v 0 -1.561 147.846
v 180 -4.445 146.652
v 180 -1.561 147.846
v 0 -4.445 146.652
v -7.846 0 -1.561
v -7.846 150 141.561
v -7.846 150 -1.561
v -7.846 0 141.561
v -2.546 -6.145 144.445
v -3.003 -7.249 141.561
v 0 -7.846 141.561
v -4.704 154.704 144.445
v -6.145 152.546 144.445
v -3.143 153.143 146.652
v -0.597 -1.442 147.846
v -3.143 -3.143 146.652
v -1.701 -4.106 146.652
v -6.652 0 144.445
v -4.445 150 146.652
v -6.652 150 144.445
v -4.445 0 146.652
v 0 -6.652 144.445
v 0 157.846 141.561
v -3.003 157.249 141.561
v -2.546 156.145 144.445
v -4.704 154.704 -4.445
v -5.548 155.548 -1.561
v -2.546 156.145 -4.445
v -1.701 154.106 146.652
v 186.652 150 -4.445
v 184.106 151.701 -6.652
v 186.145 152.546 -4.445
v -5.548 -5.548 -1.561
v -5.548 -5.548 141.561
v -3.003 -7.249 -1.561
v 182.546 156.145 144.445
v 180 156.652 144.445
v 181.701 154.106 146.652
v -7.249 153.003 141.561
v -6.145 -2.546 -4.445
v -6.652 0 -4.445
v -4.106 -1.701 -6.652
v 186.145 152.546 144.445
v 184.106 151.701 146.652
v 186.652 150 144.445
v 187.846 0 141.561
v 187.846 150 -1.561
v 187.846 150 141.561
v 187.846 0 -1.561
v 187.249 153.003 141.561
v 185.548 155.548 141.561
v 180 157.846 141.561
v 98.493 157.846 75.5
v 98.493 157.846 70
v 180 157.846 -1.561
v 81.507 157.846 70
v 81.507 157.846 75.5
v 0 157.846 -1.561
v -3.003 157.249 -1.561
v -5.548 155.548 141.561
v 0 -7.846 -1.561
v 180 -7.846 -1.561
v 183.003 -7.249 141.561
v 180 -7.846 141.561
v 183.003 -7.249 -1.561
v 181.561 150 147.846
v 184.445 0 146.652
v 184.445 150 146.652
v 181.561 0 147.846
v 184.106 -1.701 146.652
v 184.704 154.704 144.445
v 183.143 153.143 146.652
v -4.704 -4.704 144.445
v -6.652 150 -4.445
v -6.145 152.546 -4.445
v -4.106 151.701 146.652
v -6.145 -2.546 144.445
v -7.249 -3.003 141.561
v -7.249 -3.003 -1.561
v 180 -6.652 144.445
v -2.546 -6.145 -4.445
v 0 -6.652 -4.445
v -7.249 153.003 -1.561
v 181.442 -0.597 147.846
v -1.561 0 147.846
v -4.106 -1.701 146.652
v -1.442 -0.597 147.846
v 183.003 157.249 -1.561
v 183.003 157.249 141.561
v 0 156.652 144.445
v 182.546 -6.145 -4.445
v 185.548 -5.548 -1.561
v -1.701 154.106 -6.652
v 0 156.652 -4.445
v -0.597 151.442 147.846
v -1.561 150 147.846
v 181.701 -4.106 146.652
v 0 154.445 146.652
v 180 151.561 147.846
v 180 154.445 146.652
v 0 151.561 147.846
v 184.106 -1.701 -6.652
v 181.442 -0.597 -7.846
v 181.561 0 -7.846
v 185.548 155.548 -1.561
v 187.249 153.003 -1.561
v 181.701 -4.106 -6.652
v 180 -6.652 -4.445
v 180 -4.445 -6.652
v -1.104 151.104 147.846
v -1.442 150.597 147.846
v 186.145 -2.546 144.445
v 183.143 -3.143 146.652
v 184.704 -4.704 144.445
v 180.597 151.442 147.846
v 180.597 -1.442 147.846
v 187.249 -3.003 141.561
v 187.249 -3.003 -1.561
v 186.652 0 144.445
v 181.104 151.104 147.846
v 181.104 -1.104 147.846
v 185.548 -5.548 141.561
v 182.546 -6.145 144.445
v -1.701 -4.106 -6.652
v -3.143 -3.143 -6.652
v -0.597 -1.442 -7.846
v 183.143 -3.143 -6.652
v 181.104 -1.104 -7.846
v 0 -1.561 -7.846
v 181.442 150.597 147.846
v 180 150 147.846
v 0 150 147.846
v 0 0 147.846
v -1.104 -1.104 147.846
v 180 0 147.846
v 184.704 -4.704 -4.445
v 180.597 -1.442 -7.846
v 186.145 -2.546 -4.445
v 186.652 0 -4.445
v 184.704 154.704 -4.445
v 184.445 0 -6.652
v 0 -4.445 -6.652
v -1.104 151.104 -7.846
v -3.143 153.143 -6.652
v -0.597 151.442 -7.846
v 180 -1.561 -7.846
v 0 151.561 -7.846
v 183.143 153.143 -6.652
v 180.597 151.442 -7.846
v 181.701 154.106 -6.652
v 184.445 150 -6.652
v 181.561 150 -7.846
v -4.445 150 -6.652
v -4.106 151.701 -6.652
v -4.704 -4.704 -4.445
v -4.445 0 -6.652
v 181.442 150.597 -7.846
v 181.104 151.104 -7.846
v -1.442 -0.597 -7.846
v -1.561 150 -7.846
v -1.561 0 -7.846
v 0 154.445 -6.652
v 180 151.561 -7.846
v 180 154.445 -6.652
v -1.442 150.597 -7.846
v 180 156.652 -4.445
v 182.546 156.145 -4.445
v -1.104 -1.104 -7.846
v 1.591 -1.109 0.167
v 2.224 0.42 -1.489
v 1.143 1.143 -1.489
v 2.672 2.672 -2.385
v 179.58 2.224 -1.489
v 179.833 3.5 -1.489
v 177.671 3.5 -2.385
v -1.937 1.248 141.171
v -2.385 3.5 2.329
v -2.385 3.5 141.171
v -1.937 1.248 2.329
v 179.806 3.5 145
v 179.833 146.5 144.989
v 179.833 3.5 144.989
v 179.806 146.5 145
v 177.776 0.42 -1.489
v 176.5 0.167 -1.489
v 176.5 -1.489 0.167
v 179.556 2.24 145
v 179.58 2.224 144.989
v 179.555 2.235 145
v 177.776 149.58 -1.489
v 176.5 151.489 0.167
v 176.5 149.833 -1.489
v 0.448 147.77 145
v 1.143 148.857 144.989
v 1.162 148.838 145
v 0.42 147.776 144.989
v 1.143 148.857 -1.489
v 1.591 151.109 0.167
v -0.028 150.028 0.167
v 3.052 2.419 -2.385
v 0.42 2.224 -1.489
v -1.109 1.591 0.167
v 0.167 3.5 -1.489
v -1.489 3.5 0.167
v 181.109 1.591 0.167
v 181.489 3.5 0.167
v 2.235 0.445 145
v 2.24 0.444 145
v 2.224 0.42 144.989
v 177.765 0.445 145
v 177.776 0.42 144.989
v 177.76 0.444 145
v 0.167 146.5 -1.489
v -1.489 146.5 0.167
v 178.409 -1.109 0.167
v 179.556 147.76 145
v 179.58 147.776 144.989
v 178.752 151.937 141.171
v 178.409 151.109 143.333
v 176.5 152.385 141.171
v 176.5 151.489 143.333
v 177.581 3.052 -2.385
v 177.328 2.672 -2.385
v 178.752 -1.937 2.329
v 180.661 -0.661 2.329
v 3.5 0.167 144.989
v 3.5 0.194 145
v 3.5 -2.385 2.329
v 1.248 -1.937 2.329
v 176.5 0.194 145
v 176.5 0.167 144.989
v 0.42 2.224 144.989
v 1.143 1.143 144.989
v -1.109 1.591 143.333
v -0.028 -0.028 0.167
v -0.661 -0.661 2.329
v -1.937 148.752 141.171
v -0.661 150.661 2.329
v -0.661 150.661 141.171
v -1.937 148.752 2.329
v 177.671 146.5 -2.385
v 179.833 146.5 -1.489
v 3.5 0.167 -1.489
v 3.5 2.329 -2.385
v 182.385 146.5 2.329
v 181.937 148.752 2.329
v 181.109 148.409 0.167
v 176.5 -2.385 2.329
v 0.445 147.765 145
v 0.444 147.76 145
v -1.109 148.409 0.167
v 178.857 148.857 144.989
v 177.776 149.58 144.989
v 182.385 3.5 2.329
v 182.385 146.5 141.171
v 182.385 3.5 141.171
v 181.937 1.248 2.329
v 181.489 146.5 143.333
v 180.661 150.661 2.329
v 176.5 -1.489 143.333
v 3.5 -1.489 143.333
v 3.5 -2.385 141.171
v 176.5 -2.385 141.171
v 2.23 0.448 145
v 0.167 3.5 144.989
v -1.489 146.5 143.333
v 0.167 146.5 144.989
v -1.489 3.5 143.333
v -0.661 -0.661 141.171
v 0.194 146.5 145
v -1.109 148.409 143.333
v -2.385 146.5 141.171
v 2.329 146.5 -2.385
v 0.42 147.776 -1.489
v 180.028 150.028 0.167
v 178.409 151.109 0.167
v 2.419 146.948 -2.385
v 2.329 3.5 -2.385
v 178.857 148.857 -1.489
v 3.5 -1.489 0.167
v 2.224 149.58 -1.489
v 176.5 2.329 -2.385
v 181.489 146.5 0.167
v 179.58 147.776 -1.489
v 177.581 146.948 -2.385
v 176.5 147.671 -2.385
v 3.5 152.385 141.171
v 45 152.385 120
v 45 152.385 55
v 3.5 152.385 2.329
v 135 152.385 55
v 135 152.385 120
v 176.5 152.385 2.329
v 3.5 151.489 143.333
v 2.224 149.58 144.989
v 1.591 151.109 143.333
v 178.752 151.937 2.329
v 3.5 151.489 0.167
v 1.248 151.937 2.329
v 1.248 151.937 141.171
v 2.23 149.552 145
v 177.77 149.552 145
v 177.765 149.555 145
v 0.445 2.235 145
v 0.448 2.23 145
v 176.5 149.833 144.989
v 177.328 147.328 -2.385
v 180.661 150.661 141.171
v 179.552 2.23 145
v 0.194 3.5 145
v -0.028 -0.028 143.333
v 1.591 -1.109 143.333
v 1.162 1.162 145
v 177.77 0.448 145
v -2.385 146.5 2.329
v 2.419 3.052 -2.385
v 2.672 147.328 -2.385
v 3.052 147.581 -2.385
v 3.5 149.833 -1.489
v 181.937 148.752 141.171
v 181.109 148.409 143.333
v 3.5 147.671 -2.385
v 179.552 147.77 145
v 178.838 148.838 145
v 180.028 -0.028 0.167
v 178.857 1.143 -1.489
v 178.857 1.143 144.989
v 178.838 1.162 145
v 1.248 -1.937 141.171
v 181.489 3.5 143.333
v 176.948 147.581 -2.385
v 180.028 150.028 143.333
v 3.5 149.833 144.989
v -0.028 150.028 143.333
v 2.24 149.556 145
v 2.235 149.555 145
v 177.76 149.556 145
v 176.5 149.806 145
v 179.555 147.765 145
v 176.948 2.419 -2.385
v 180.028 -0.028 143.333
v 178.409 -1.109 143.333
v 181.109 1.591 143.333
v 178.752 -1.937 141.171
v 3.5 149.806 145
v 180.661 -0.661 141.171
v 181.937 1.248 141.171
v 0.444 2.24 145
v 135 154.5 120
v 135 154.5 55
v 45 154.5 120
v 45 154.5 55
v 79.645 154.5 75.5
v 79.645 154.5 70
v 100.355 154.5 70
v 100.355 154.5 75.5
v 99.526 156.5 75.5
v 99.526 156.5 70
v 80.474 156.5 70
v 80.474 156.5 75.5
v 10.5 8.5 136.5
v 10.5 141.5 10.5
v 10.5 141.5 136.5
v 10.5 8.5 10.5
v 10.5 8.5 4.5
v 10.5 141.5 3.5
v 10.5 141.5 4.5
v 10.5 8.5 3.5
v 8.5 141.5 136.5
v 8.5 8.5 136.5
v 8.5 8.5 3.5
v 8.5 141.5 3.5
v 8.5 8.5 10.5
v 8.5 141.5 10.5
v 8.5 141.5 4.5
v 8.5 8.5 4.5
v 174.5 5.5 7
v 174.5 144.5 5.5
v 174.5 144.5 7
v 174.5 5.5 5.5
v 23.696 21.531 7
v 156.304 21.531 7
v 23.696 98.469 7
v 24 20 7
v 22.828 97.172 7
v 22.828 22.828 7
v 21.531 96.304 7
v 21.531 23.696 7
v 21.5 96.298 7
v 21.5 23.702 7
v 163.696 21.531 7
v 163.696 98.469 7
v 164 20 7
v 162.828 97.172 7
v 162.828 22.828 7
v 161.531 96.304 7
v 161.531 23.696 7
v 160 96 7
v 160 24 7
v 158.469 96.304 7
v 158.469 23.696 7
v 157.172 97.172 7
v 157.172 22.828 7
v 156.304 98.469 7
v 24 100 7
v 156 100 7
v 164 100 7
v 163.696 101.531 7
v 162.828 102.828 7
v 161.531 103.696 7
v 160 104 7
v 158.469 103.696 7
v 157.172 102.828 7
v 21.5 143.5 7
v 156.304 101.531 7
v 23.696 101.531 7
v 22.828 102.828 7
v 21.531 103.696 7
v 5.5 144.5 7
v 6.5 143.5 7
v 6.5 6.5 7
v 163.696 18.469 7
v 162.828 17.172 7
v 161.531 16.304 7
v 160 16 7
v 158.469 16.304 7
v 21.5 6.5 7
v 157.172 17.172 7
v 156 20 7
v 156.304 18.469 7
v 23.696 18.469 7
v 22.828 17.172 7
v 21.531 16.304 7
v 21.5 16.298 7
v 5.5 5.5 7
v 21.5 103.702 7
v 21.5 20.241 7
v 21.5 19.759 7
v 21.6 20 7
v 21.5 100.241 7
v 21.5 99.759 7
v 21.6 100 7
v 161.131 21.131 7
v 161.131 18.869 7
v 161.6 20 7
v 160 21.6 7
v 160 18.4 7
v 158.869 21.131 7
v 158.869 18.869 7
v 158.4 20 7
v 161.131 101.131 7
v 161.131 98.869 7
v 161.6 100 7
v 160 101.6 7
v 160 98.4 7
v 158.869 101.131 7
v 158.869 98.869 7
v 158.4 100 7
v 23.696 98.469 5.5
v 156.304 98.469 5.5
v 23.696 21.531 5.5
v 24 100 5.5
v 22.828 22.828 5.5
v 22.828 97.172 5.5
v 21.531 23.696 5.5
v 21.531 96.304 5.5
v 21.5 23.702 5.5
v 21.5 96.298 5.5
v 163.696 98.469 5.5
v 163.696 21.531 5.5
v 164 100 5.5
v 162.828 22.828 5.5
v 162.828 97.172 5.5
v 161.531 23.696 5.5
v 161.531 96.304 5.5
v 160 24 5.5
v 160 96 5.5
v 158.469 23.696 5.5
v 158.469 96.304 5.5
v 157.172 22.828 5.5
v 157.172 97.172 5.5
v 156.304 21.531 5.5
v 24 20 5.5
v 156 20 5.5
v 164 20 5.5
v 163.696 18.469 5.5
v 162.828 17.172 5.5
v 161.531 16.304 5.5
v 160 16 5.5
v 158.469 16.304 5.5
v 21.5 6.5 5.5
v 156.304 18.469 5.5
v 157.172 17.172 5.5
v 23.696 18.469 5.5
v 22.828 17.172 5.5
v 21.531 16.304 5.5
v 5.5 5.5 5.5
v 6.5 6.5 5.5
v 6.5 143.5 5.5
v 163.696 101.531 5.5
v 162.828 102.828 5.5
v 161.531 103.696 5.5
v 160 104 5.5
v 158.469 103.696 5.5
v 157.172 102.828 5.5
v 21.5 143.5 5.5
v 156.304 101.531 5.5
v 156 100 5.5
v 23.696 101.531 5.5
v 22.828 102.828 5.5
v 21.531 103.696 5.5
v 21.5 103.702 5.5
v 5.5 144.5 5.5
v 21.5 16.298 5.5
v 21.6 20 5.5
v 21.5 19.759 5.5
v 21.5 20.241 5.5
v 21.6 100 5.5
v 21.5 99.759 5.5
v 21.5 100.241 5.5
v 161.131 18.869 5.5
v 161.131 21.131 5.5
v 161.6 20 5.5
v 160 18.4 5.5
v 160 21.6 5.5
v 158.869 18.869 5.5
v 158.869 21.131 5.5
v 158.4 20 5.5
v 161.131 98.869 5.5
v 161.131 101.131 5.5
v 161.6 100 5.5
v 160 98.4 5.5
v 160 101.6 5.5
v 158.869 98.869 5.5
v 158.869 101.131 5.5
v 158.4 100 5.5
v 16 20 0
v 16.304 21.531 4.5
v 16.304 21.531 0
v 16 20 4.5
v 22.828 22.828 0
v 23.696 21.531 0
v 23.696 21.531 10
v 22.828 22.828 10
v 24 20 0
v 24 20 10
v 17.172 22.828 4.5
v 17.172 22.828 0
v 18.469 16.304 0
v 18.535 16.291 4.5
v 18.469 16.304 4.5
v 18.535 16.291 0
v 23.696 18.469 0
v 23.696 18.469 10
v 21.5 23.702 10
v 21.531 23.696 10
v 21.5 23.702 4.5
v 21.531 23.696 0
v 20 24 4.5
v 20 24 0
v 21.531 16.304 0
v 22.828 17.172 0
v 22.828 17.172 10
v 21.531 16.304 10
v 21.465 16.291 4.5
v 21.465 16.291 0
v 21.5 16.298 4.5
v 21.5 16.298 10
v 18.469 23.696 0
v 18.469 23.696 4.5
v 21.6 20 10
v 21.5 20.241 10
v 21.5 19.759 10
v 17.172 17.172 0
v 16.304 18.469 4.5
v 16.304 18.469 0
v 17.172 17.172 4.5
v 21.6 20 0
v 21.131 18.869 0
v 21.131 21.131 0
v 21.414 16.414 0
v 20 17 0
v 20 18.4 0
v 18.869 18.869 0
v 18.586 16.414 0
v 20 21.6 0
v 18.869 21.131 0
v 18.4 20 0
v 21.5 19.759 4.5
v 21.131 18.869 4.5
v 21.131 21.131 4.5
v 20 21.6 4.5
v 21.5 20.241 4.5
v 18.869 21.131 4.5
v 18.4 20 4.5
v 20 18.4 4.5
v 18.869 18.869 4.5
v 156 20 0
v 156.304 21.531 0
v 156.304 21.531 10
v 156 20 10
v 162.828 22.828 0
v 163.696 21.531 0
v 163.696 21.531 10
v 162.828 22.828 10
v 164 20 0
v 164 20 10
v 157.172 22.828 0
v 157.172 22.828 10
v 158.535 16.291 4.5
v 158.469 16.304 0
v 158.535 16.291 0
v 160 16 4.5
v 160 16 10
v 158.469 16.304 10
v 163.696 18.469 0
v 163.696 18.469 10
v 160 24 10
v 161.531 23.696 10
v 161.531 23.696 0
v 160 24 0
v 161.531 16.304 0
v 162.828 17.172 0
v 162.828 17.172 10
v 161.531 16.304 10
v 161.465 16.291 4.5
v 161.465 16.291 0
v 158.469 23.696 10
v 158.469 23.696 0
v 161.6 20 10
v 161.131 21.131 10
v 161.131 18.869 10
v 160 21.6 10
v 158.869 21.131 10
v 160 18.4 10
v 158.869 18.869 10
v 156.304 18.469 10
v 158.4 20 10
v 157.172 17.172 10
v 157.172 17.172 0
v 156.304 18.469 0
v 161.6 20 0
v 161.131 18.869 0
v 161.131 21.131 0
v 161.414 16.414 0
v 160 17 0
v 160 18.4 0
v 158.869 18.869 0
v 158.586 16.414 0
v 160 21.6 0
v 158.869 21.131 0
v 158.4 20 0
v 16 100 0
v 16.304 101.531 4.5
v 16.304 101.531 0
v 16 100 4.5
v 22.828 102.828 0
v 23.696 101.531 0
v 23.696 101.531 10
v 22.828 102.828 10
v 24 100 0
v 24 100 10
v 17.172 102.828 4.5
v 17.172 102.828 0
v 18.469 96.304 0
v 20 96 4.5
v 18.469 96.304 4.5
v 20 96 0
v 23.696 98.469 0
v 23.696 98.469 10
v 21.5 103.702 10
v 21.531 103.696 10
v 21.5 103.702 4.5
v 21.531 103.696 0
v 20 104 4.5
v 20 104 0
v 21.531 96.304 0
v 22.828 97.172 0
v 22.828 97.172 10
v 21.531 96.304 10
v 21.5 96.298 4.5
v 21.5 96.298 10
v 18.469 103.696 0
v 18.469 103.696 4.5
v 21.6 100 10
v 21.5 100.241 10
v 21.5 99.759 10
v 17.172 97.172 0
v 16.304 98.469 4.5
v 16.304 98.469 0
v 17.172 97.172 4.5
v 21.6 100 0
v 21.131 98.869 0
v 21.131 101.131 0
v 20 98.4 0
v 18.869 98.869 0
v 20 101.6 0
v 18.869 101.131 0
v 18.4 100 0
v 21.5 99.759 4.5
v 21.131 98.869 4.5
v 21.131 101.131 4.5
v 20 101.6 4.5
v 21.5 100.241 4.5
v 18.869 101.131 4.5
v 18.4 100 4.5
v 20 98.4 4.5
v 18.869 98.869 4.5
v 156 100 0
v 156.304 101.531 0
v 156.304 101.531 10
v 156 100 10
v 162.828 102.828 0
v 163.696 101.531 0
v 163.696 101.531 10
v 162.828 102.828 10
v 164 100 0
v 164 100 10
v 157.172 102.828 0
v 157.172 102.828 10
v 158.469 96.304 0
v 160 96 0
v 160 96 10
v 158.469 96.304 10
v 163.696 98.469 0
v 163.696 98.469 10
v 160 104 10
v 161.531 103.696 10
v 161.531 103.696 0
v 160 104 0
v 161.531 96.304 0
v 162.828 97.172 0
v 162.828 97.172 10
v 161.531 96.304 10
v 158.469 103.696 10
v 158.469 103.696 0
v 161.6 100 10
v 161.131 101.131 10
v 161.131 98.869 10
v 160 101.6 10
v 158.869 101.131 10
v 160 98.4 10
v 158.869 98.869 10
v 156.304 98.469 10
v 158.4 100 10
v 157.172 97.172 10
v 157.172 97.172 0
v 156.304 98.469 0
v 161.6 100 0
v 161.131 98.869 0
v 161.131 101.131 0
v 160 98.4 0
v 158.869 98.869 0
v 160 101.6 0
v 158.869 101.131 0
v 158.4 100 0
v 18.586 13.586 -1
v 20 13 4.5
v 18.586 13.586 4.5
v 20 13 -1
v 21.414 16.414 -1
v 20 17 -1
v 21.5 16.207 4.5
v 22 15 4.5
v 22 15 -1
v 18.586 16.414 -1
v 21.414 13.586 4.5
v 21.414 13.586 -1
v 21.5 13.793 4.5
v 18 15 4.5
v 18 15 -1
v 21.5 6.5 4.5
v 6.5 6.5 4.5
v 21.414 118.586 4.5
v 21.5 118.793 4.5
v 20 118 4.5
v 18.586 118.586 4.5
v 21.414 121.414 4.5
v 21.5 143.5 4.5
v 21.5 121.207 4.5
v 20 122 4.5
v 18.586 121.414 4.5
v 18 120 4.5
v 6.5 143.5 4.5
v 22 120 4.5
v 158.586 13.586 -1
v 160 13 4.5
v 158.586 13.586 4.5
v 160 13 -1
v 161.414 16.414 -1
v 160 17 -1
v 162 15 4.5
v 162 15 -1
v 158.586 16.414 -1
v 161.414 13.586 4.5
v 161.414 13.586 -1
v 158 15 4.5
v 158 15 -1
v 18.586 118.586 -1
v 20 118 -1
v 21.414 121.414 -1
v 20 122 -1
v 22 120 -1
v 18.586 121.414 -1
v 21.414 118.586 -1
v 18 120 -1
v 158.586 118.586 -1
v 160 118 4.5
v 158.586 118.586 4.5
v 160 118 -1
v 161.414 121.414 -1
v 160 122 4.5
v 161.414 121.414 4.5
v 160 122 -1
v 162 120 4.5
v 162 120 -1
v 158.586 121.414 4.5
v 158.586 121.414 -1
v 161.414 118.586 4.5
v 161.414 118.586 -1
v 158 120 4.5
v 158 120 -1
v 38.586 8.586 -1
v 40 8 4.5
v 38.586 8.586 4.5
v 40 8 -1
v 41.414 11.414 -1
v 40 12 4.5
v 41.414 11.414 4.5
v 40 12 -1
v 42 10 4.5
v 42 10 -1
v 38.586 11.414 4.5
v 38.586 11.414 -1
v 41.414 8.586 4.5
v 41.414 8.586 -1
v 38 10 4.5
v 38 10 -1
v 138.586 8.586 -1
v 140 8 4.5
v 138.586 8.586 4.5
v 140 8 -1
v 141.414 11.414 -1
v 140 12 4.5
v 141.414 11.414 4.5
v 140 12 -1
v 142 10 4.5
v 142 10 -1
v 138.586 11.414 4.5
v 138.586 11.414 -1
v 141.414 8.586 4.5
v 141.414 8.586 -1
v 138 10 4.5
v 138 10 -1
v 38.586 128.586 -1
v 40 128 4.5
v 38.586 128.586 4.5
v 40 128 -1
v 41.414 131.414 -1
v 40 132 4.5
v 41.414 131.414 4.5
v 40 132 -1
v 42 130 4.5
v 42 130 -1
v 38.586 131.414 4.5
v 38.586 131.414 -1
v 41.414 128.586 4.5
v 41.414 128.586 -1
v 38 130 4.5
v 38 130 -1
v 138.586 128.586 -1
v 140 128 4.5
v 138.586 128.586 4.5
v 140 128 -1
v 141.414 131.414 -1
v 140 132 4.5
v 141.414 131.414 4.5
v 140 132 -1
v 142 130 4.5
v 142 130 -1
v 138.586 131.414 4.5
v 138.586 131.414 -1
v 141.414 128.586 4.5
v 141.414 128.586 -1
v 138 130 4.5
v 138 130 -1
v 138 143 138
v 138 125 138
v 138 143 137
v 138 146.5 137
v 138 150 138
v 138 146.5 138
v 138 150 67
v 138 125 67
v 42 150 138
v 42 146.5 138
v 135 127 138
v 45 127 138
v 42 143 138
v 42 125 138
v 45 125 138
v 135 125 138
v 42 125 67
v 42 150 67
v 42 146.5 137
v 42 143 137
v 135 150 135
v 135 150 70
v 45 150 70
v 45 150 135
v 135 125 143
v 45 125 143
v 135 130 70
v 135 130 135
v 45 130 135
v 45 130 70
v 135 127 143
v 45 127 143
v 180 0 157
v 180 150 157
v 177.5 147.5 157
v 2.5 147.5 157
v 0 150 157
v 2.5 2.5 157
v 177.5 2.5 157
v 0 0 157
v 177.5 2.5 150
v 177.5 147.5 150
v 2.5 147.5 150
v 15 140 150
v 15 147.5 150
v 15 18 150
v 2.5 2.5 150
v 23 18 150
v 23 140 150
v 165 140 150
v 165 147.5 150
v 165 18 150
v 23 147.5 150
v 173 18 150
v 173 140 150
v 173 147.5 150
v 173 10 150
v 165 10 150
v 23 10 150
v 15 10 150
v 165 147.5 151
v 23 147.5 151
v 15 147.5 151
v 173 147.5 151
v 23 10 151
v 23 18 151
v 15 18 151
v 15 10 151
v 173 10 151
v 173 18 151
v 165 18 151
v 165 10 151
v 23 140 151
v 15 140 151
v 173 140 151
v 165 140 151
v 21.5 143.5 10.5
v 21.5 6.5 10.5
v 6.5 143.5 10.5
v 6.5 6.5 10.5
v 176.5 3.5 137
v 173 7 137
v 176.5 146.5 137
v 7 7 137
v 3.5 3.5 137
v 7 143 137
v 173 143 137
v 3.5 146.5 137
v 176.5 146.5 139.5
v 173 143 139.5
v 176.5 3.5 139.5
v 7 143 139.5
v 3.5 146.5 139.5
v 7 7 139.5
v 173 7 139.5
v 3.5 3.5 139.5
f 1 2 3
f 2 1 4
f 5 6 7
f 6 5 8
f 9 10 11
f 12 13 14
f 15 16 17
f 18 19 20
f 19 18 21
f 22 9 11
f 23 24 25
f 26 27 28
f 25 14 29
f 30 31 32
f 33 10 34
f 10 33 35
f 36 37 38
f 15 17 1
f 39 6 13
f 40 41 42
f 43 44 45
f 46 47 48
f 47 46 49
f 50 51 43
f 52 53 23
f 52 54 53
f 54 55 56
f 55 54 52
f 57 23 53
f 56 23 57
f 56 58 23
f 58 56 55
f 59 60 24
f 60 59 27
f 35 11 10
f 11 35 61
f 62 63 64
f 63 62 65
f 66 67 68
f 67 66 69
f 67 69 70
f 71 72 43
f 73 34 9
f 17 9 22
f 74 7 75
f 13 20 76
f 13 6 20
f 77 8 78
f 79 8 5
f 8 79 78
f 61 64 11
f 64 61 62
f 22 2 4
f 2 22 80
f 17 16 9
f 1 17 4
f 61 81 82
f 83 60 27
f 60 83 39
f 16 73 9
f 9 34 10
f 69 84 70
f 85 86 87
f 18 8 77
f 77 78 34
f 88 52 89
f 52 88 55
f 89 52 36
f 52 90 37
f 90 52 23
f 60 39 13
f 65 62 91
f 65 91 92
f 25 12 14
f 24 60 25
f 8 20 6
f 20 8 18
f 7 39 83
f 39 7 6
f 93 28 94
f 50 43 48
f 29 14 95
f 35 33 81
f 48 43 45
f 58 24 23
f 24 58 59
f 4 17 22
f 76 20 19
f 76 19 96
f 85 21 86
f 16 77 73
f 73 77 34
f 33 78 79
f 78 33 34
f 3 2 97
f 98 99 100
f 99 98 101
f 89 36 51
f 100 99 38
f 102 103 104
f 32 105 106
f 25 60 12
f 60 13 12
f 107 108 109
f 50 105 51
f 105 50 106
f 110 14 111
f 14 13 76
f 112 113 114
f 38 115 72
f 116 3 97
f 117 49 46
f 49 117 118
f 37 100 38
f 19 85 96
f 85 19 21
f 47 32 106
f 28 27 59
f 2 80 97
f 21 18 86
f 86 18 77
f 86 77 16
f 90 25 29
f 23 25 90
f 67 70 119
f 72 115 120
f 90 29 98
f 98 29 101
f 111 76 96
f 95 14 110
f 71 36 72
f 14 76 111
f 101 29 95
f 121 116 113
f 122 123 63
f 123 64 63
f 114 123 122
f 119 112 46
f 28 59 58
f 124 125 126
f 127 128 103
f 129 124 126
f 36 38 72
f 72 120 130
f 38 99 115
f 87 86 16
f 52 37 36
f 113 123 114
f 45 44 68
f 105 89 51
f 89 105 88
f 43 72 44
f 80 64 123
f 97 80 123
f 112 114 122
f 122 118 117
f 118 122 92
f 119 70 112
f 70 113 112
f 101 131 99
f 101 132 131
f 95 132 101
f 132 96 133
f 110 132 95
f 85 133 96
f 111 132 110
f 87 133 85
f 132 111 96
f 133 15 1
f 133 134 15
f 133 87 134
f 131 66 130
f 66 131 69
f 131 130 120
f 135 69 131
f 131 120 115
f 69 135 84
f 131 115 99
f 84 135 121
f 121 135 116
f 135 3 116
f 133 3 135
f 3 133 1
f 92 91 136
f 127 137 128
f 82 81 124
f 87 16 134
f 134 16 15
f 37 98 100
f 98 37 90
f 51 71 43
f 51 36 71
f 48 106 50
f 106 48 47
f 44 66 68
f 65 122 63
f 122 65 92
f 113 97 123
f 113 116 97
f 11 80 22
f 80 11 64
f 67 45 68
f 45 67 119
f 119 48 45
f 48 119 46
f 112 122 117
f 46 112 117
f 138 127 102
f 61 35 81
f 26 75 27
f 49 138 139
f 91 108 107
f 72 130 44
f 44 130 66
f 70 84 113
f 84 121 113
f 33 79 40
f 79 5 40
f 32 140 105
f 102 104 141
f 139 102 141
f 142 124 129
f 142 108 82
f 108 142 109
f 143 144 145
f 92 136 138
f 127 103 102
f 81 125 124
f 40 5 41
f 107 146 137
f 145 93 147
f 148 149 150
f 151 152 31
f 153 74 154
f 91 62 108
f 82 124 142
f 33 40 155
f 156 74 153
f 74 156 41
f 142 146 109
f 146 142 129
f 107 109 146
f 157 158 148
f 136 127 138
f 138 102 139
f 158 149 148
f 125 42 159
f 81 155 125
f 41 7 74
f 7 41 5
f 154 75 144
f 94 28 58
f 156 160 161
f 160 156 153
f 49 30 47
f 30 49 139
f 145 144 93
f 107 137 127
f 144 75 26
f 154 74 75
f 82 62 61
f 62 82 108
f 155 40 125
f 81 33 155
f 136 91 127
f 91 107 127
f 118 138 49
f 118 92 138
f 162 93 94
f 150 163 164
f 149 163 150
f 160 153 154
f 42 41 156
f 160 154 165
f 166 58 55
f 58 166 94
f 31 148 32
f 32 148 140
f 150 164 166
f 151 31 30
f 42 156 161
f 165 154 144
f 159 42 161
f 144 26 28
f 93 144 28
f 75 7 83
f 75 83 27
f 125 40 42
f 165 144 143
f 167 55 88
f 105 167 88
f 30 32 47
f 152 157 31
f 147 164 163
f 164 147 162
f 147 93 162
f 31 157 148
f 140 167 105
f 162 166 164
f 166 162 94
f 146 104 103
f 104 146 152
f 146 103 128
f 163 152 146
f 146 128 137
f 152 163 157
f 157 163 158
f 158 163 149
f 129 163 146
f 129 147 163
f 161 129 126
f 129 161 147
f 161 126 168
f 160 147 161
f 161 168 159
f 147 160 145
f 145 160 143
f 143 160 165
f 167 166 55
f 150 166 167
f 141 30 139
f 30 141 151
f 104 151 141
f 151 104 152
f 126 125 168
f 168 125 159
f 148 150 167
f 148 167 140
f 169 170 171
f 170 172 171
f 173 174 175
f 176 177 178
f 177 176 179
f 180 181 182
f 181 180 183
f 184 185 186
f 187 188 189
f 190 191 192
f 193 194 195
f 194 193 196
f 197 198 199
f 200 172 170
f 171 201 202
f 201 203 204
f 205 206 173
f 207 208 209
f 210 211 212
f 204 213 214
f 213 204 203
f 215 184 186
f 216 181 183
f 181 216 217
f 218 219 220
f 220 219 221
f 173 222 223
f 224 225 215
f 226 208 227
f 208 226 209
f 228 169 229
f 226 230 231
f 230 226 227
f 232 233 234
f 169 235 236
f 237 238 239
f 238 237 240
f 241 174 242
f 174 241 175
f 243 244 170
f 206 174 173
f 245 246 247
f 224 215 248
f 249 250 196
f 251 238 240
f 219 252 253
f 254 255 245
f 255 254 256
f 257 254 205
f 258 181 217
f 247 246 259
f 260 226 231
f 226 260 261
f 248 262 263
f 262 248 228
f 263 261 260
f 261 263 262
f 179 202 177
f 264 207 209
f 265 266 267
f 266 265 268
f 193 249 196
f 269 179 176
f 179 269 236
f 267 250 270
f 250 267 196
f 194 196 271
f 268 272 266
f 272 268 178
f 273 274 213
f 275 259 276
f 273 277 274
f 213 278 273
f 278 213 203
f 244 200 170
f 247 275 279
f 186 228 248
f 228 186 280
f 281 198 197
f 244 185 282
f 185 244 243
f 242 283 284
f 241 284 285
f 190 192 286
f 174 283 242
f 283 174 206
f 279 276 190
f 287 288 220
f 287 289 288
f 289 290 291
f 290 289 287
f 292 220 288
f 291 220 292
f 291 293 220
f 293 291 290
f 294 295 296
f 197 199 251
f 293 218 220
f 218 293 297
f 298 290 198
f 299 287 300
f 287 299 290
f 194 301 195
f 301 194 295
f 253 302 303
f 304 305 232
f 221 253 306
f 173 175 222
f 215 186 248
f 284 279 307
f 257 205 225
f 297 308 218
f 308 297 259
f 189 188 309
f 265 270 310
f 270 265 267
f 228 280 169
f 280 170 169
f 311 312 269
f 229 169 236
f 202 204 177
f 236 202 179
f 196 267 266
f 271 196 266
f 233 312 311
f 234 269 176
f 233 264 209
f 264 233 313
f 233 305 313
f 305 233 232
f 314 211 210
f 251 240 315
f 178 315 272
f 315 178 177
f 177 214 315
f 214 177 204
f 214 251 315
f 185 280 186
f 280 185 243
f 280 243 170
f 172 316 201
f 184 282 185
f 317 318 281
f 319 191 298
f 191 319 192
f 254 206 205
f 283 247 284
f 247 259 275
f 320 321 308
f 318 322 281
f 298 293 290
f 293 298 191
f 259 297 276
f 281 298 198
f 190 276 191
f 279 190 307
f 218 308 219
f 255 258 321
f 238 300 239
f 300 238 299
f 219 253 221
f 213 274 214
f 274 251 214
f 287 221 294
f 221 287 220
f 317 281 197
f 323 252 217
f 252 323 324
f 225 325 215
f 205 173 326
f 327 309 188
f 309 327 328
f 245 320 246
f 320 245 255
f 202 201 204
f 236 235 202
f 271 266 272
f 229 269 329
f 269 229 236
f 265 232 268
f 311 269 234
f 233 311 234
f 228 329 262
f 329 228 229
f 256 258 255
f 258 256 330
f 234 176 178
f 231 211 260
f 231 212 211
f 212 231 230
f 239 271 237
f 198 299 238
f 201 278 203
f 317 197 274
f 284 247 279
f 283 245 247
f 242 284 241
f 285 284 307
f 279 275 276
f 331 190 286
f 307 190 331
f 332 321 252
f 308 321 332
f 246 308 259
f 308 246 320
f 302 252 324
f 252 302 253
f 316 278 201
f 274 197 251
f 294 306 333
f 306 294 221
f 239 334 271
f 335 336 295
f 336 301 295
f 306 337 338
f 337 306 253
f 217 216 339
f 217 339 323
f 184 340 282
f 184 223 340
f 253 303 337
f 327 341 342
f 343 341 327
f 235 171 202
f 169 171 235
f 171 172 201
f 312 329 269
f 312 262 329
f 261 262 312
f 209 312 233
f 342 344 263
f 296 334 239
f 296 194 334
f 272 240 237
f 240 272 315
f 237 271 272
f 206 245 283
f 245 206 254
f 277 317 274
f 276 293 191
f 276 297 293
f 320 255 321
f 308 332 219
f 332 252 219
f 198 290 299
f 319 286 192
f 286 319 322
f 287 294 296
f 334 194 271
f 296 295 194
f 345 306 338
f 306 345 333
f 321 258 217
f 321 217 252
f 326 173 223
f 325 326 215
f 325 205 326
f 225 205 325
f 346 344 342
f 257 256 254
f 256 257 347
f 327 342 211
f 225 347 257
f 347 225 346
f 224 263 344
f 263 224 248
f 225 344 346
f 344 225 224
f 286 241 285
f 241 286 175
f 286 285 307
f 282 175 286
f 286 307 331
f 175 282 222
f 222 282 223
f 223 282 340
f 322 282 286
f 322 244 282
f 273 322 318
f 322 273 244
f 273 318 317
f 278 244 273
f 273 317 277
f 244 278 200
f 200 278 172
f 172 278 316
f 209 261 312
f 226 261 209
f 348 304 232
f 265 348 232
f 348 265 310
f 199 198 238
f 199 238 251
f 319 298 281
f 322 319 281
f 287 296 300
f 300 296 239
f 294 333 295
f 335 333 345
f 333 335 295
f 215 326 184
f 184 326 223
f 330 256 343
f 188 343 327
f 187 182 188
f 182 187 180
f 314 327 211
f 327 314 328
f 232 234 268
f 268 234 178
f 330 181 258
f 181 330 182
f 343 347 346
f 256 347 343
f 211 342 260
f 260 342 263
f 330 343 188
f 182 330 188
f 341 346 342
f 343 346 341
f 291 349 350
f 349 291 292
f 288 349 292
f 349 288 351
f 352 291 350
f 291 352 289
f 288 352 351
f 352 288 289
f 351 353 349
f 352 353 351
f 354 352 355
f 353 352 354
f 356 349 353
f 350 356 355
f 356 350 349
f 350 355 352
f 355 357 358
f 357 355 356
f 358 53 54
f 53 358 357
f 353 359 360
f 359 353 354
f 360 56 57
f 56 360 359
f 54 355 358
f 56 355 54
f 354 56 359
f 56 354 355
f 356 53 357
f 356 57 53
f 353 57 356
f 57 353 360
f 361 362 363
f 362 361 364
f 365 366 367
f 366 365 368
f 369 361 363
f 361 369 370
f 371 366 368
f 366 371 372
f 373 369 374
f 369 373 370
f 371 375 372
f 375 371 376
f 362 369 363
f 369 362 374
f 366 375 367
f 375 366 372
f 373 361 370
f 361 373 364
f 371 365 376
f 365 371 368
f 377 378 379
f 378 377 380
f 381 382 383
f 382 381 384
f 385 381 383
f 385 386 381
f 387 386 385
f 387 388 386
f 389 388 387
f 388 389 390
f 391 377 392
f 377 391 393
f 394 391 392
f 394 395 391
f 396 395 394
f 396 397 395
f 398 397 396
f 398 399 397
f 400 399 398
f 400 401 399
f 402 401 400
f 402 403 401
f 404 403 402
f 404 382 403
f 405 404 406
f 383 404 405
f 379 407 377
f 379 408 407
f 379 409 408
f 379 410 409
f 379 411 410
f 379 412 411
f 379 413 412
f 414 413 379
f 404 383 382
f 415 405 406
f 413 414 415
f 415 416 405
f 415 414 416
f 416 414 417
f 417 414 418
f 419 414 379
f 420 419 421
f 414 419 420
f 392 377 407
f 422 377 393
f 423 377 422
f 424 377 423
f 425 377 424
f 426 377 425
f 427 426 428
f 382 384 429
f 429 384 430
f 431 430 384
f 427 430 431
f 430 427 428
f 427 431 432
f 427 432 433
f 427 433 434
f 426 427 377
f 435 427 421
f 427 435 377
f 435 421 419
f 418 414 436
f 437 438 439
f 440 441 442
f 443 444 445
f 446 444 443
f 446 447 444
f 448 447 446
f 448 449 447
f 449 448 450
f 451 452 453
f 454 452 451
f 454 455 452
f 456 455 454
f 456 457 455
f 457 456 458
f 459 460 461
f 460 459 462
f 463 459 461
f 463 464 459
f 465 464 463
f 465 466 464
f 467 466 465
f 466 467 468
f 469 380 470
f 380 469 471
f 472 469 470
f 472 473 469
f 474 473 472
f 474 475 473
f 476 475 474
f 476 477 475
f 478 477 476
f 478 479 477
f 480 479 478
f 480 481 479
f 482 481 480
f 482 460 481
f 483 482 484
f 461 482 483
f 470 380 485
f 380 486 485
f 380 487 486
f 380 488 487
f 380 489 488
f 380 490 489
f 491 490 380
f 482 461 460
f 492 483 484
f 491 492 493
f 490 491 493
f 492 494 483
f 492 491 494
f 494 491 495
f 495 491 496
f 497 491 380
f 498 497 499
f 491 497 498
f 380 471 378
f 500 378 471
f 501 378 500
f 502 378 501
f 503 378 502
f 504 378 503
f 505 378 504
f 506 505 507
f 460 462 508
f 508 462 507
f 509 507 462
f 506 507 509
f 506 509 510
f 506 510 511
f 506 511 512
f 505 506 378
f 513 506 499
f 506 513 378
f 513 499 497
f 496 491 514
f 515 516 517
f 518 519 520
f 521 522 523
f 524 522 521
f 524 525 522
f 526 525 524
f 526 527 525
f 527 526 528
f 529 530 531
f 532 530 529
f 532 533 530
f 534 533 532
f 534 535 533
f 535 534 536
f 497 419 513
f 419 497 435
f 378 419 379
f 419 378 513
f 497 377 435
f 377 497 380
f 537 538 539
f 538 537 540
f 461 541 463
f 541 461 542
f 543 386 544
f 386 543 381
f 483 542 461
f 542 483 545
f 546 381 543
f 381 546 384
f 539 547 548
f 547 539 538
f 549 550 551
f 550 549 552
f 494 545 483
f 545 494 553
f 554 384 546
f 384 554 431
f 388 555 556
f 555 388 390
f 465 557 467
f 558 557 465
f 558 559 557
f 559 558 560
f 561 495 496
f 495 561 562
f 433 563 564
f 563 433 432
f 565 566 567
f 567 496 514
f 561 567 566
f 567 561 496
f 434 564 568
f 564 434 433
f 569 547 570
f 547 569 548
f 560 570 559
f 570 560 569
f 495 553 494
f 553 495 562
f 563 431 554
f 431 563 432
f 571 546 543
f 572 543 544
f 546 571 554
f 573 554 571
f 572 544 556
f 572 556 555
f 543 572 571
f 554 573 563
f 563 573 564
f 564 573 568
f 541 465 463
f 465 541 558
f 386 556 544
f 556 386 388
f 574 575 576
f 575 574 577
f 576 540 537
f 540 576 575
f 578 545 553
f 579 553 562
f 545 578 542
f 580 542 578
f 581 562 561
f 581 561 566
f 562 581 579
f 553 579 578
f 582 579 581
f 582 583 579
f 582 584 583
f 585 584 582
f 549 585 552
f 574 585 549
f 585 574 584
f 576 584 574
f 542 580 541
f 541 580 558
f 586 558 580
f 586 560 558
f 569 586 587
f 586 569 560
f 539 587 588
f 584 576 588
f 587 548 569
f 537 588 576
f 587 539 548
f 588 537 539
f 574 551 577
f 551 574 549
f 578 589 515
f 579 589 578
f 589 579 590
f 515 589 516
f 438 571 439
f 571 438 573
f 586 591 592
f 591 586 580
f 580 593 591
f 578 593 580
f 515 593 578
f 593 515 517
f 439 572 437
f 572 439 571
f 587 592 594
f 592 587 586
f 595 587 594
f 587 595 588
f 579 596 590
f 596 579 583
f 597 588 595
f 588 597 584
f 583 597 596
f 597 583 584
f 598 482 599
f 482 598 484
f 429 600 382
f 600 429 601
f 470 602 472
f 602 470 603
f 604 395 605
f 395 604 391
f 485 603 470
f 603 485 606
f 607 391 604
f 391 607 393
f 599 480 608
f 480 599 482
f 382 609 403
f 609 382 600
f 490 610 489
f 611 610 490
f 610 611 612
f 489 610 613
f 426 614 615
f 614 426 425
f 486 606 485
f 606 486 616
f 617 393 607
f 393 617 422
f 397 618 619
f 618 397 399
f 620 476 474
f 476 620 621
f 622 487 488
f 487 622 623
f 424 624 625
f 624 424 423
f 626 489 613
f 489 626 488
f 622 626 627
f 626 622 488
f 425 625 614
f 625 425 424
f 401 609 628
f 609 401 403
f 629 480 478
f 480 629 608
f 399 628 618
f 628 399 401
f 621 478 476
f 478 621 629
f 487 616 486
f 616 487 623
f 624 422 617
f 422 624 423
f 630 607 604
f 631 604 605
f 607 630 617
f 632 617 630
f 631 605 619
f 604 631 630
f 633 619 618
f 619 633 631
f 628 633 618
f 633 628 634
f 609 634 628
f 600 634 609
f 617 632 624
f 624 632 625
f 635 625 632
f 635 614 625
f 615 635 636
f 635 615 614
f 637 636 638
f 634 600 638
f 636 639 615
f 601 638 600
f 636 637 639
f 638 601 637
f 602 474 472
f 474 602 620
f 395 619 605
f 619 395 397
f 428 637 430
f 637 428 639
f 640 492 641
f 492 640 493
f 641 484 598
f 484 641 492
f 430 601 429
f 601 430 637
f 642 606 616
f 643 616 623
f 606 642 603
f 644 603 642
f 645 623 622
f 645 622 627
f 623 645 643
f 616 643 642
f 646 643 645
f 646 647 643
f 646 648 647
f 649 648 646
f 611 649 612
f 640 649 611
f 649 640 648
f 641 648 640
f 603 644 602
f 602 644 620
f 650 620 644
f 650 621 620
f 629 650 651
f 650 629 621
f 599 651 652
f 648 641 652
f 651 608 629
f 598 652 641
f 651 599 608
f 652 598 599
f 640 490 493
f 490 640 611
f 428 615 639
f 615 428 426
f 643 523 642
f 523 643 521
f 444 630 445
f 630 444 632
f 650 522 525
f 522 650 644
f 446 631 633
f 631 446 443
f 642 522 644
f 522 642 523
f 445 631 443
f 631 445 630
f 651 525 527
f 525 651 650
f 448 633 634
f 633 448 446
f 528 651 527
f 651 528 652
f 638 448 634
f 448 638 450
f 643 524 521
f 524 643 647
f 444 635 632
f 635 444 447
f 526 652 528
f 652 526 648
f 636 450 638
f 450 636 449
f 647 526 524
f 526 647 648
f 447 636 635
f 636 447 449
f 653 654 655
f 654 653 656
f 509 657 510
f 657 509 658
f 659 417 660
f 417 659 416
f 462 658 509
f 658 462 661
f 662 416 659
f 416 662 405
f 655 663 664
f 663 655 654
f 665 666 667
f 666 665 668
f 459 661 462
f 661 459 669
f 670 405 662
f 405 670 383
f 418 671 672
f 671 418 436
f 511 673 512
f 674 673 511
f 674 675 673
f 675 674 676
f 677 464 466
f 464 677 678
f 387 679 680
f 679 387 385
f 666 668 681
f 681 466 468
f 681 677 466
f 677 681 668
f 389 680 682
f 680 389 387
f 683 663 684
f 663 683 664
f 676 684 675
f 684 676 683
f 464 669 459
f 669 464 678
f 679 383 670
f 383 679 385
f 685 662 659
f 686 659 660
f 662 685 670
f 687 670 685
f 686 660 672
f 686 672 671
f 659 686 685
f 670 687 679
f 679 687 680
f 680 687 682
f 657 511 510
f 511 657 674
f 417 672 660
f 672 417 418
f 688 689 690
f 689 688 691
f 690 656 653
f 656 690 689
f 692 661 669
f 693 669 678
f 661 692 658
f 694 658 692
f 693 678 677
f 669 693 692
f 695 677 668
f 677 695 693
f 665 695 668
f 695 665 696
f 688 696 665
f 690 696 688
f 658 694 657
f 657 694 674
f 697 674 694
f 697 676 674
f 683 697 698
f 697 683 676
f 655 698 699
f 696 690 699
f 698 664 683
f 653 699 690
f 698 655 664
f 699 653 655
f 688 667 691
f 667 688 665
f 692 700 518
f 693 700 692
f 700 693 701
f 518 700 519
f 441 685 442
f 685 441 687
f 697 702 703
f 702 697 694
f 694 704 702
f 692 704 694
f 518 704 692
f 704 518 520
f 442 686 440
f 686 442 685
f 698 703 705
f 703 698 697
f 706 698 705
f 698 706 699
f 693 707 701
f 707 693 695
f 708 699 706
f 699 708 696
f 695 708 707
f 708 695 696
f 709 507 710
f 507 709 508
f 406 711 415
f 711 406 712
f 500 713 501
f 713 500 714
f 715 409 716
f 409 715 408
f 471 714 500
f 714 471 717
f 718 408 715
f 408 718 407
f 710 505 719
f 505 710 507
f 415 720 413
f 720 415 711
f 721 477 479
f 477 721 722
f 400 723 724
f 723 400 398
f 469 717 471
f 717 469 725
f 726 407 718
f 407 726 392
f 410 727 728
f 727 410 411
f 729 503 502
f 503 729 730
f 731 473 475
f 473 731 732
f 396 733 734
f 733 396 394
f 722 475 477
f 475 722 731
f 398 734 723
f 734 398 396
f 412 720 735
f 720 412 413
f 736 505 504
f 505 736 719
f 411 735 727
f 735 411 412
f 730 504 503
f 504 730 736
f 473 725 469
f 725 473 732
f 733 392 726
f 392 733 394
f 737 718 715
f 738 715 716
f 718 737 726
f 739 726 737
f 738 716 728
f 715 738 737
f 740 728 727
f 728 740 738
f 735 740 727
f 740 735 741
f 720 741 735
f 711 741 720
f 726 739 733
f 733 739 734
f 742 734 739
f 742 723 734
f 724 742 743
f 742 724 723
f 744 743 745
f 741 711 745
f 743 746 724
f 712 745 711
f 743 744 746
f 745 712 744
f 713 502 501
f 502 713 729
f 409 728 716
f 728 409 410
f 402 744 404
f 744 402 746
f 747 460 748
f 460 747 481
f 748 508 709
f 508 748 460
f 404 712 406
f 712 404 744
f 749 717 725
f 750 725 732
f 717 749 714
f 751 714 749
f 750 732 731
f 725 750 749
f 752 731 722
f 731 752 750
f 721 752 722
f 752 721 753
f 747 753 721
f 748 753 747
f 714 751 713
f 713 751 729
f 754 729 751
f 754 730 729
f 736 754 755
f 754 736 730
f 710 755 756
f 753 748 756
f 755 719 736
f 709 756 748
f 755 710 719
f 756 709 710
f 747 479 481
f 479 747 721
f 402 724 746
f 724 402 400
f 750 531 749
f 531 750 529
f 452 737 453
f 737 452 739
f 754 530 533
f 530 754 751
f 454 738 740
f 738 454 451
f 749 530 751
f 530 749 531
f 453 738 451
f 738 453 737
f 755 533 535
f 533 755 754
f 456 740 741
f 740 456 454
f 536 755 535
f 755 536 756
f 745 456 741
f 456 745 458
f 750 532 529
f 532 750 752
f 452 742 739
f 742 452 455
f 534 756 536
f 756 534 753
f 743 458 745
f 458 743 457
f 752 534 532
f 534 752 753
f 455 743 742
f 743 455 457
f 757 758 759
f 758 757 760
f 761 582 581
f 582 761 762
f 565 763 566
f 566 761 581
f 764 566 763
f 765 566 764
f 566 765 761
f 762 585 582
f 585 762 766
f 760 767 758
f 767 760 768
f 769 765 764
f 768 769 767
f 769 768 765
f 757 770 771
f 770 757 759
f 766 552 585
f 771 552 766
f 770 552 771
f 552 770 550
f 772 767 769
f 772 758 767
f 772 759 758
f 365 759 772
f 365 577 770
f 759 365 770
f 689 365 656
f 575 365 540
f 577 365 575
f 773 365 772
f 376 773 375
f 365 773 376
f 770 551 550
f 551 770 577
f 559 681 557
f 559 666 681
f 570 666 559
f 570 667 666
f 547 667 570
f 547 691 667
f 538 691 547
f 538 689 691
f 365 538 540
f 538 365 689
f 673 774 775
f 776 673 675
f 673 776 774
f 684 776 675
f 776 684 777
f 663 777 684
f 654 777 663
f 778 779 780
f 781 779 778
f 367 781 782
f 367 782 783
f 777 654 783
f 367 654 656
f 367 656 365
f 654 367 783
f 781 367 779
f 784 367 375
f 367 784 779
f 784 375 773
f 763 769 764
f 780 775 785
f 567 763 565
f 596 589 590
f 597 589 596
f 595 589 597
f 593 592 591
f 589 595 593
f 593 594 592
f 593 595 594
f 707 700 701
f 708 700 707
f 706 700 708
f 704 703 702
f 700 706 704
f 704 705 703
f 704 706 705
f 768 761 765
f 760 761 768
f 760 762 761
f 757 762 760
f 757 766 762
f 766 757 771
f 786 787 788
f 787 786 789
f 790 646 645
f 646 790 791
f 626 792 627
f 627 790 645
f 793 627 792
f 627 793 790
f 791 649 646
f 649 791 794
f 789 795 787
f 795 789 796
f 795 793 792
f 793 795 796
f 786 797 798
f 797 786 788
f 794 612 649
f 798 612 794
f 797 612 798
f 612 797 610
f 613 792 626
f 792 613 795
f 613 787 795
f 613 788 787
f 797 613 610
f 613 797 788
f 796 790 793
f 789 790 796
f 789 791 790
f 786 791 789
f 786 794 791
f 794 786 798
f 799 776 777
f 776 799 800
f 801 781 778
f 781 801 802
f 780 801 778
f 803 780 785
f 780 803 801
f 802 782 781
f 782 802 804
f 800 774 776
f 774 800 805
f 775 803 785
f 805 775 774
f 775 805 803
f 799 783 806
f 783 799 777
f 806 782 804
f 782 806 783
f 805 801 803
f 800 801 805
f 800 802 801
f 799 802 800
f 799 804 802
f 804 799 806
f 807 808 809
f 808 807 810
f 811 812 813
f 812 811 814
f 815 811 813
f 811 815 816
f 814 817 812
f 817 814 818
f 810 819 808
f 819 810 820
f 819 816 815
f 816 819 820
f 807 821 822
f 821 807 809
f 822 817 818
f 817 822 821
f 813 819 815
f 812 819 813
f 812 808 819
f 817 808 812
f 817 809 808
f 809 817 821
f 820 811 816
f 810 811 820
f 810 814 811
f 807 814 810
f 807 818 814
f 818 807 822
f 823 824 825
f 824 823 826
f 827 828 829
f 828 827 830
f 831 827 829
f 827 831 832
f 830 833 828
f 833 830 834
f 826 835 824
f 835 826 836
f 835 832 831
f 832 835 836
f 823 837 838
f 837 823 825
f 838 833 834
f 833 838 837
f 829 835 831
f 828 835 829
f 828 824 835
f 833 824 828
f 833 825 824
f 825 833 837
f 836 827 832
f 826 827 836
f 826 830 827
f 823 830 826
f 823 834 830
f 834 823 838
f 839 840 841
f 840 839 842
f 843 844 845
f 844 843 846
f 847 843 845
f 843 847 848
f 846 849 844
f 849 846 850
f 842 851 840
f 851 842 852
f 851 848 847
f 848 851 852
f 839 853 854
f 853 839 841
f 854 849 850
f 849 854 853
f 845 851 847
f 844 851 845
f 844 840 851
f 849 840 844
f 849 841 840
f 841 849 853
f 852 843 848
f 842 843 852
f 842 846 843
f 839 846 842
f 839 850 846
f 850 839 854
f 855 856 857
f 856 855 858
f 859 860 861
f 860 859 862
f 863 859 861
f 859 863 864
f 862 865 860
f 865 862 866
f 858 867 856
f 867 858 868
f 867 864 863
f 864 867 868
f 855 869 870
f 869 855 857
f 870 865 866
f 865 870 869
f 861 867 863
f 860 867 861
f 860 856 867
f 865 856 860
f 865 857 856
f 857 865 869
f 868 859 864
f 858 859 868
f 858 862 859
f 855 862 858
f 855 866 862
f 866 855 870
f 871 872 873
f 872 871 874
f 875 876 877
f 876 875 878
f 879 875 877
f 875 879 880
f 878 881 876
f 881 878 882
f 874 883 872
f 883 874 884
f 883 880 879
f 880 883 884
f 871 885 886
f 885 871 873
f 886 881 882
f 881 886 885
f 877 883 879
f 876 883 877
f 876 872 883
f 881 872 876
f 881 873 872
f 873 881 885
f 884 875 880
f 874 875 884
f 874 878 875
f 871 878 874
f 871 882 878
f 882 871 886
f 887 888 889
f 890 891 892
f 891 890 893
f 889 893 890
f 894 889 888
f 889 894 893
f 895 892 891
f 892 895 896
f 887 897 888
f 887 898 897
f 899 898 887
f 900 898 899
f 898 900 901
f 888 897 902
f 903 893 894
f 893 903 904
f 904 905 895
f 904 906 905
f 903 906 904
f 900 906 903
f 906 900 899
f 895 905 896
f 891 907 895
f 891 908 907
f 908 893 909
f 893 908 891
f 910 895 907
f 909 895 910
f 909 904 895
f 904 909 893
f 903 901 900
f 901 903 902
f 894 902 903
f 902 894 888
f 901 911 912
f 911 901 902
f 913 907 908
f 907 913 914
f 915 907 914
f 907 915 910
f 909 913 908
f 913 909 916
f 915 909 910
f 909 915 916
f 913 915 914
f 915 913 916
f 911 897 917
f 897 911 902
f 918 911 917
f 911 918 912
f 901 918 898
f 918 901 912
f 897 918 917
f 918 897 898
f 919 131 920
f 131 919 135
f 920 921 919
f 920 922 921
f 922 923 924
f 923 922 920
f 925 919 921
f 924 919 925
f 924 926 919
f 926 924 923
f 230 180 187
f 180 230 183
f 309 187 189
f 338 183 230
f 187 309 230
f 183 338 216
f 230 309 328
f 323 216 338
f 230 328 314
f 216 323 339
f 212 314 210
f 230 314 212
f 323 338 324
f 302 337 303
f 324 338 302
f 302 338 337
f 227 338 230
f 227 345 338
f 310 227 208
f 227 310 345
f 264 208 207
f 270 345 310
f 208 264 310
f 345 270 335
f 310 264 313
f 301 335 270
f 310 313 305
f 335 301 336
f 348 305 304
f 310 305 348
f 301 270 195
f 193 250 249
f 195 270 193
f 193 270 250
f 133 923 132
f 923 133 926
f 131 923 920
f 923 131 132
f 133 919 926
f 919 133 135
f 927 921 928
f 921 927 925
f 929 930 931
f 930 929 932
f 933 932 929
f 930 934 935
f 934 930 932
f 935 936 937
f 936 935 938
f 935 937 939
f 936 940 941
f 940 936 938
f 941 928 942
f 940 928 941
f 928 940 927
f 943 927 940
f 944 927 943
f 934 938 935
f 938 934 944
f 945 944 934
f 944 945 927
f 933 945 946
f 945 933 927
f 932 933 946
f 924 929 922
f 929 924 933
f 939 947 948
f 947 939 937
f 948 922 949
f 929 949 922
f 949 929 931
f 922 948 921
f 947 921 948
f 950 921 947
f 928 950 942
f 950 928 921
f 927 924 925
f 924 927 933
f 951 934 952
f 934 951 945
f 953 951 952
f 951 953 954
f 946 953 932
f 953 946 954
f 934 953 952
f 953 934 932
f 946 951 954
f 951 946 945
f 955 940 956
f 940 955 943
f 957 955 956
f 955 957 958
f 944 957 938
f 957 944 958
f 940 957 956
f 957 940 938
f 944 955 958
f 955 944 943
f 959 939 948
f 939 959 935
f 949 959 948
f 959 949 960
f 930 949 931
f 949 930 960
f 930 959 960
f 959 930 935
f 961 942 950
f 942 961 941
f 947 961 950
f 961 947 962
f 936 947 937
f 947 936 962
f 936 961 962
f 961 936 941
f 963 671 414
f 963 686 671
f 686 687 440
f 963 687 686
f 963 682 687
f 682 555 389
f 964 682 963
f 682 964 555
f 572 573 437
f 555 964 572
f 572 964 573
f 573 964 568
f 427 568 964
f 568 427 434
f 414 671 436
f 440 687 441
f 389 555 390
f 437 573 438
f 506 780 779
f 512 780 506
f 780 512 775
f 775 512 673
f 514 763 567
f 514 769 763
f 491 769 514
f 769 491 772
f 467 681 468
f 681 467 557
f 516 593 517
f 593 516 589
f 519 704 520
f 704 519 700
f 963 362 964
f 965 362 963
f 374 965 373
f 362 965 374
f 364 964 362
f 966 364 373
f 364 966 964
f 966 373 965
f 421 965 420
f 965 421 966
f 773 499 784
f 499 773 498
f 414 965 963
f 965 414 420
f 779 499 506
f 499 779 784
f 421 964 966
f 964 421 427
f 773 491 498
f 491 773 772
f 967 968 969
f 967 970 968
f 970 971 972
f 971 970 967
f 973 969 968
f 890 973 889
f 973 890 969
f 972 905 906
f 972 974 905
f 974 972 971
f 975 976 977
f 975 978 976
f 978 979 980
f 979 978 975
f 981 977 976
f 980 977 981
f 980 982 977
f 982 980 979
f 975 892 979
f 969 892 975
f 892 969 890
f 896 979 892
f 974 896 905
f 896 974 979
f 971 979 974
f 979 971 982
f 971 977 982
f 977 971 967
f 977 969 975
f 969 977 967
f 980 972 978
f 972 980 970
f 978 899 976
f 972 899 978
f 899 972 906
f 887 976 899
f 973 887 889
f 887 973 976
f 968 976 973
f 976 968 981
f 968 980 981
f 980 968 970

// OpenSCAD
// ============================================================================
// VHF/UHF REMOTE ELEMENT SWITCHING SYSTEM
// MAIN ESP32 CYD CONTROLLER HOUSING
// For mast-top or ground-mount controller with touchscreen UI
// Weather-sealed enclosure with power, RF, and control ports
// ============================================================================

// Parameters (all dimensions in mm, fits 200x200x200 build volume)

// External box dimensions
box_w = 180;          // Width (X) - accounts for 3.5" display
box_d = 150;          // Depth (Y) - front-to-back
box_h = 140;          // Height (Z) - vertical dimension

// Wall thickness
wall_thick = 3.5;     // 3.5mm PETG for strength

// CYD Display parameters (3.5" 480x320)
cyd_width = 90;       // Display physical width (mm)
cyd_height = 65;      // Display physical height (mm)
cyd_bezel = 3;        // Bezel margin from edge

// Connector ports
usb_c_width = 12;     // USB-C charging port
usb_c_height = 6;
sma_hole_d = 6.5;     // SMA connector holes

// Screw mounting
screw_hole_d = 4.0;   // M3 mounting holes
mounting_post_h = 10; // Posts for PCB standoff

// ============== MAIN ENCLOSURE ==============

module main_box() {
  difference() {
    // Outer box
    rounded_cube([box_w, box_d, box_h], 8, center=false);

    // Interior hollow
    translate([wall_thick, wall_thick, wall_thick])
      rounded_cube([box_w - 2*wall_thick,
                   box_d - 2*wall_thick,
                   box_h - wall_thick],
                  6, center=false);

    // Display cutout (front face, top half)
    display_x = (box_w - cyd_width) / 2;
    display_y = box_d - 1;
    display_z = box_h - cyd_height - 20;

    translate([display_x, display_y, display_z])
      cube([cyd_width, wall_thick + 2, cyd_height], center=false);

    // USB-C charging port (bottom-front)
    translate([box_w/2 - usb_c_width/2, -1, 15])
      cube([usb_c_width, wall_thick + 2, usb_c_height], center=false);

    // SMA antenna connectors (2x, right side)
    translate([box_w - wall_thick - 1, box_d/2 - 20, 40])
      cylinder(d=sma_hole_d, h=wall_thick + 2, $fn=16);
    translate([box_w - wall_thick - 1, box_d/2 + 20, 40])
      cylinder(d=sma_hole_d, h=wall_thick + 2, $fn=16);

    // Control cable port (back, M20 cable gland)
    translate([box_w/2, box_d + 1, box_h/2])
      cylinder(d=22, h=wall_thick + 2, $fn=24);

    // Ventilation slots (sides, for heat escape)
    for (side = [0, 1]) {
      x_offset = side * (box_w - wall_thick - 2);
      for (i = [0:4]) {
        z_pos = 30 + i * 18;
        translate([x_offset - 1, 30 + i*10, z_pos])
          cube([wall_thick + 2, 12, 3], center=false);
      }
    }
  }
}

// ============== ROUNDED CORNER CUBE (Helper) ==============

module rounded_cube(size, radius, center=false) {
  if (center) {
    translate(-size/2)
      rounded_cube(size, radius, center=false);
  } else {
    $fn = 16;
    hull() {
      // Eight corner spheres
      sphere(r=radius);
      translate([size.x, 0, 0]) sphere(r=radius);
      translate([0, size.y, 0]) sphere(r=radius);
      translate([size.x, size.y, 0]) sphere(r=radius);
      translate([0, 0, size.z]) sphere(r=radius);
      translate([size.x, 0, size.z]) sphere(r=radius);
      translate([0, size.y, size.z]) sphere(r=radius);
      translate([size.x, size.y, size.z]) sphere(r=radius);
    }
  }
}

// ============== DISPLAY BEZEL / FACEPLATE ==============

module display_bezel() {
  difference() {
    // Outer bezel frame
    translate([(box_w - cyd_width - 2*cyd_bezel)/2,
               box_d - 25,
               box_h - cyd_height - cyd_bezel - 5])
      cube([cyd_width + 2*cyd_bezel, 25, cyd_height + 2*cyd_bezel], center=false);

    // Interior cutout for display
    translate([(box_w - cyd_width)/2, box_d - 20, box_h - cyd_height - 5])
      cube([cyd_width, 25, cyd_height], center=false);

    // Touch button holes (3x, below display)
    button_spacing = 35;
    for (i = [0:2]) {
      translate([box_w/2 - button_spacing + i*button_spacing, box_d - 8, box_h - 15])
        cylinder(d=8, h=8, $fn=16);
    }
  }

  // Bezel decoration (optional raised ring)
  translate([(box_w - cyd_width)/2, box_d - 25, box_h - cyd_height - 3])
    cube([cyd_width, 2, cyd_height + 6], center=false);
}

// ============== INTERNAL PCB MOUNTING POSTS ==============

module pcb_standoffs() {
  // 4 corner posts for main PCB (Rock64 or ESP32 dev board)
  post_locations = [
    [20, 20, 0],
    [box_w - 20, 20, 0],
    [20, box_d - 50, 0],
    [box_w - 20, box_d - 50, 0]
  ];

  for (loc = post_locations) {
    translate(loc)
      difference() {
        cylinder(d=8, h=mounting_post_h, $fn=16);
        // Center hole for M3 screw
        cylinder(d=3.2, h=mounting_post_h + 2, $fn=8);
      }
  }
}

// ============== CABLE GLAND ==============

module cable_gland_assembly() {
  // M20 gland for control cable (rear)
  difference() {
    cylinder(d=25, h=8, $fn=24);
    // Cable hole (6mm for shielded twisted pair)
    cylinder(d=6, h=10, $fn=16);
  }
}

// ============== INTERNAL STRUCTURE ==============

module internal_structure() {
  // Compartment divider (separates RF from logic)
  translate([wall_thick + 5, wall_thick + 5, wall_thick])
    cube([2, box_d - 2*wall_thick - 10, box_h - 2*wall_thick], center=false);

  // PCB tray bottom
  translate([wall_thick + 2, wall_thick + 2, wall_thick + 2])
    cube([box_w - 2*wall_thick - 4, box_d - 2*wall_thick - 4, 1.5], center=false);
}

// ============== BOTTOM CABLE ROUTING ==============

module cable_channel() {
  // Channel along bottom for control cable routing
  translate([wall_thick + 3, wall_thick + 3, wall_thick + 1])
    cube([15, box_d - 2*wall_thick - 6, 6], center=false);
}

// ============== DRAINAGE HOLES ==============

module drainage() {
  // 8 small drainage holes (bottom perimeter) to prevent water pooling
  drain_r = 2.0;
  drain_positions = [
    [20, 15, -1],
    [box_w - 20, 15, -1],
    [20, box_d - 30, -1],
    [box_w - 20, box_d - 30, -1],
    [40, 10, -1],
    [box_w - 40, 10, -1],
    [40, box_d - 20, -1],
    [box_w - 40, box_d - 20, -1]
  ];

  for (pos = drain_positions) {
    translate(pos)
      cylinder(d=drain_r * 2, h=wall_thick + 2, $fn=8);
  }
}

// ============== GASKET CHANNEL (LID SEALING) ==============

module gasket_channel() {
  // Groove for O-ring sealing (top edges)
  groove_w = 3.5;
  groove_d = 2.5;

  // Top rim channel
  translate([wall_thick, wall_thick, box_h - 3])
    linear_extrude(height=groove_d)
      difference() {
        square([box_w - 2*wall_thick, box_d - 2*wall_thick]);
        offset(-groove_w)
          square([box_w - 2*wall_thick, box_d - 2*wall_thick]);
      }
}

// ============== LID ASSEMBLY ==============

module lid() {
  difference() {
    // Lid outer surface
    cube([box_w, box_d, 12], center=false);

    // Interior recess
    translate([wall_thick - 1, wall_thick - 1, 5])
      cube([box_w - 2*(wall_thick - 1),
            box_d - 2*(wall_thick - 1),
            12],
           center=false);
  }

  // Snap tabs (4 positions)
  snap_tabs = [
    [15, 10, 0],
    [box_w - 15, 10, 0],
    [15, box_d - 10, 0],
    [box_w - 15, box_d - 10, 0]
  ];

  for (tab = snap_tabs) {
    translate(tab)
      cube([8, 8, 6], center=false);
  }
}

// ============== FINAL ASSEMBLY ==============

// Main enclosure
main_box();

// Internal structure
internal_structure();

// PCB standoff posts
pcb_standoffs();

// Cable channel
cable_channel();

// Drainage holes
drainage();

// Gasket channel
gasket_channel();

// Display bezel
display_bezel();

// Lid (position above base for visualization)
translate([0, 0, box_h + 5])
  lid();

/*
ASSEMBLY INSTRUCTIONS:

1. PRINTING:
   - Print in PETG or ASA (weather resistant)
   - Nozzle: 240°C, Bed: 85°C
   - Layer height: 0.2mm, Infill: 20%
   - Print time: ~6-7 hours, ~100g filament
   - Supports: Tree supports for cable gland and ventilation slots

2. PREPARATION:
   - Clean all support material and raft
   - Sand edge of display cutout smooth (medium grit)
   - Install brass inserts in PCB standoff holes (M3)
   - Apply conformal coating to PCB before installation

3. PCB INSTALLATION:
   - Install main PCB (Rock64 or ESP32+WiFi) on posts with M3 screws
   - CYD touchscreen mounted to display bezel frame
   - Antenna connectors (SMA) on right side, secured with RTV sealant

4. SEALING:
   - Install O-ring (3.2mm OD × 2.4mm ID NBR70) in top gasket channel
   - Apply thin layer of silicone grease to O-ring for lubrication
   - Place lid, align snap tabs with recesses, press down firmly
   - Lid should require moderate downward force (~2 kg)

5. EXTERNAL CONNECTORS:
   - USB-C: Strain relief boot, angled connector if possible
   - Control cable: M20 gland, shielded twisted pair, ferrite at entry
   - RF/Antenna: SMA bulkhead, apply dielectric grease to threads

6. MOUNTING:
   - Mount to mast clamp or ground tripod
   - Orient USB-C port downward (drain water if it enters)
   - Face touchscreen toward operator (N facing, typically)
   - Ensure ventilation slots face away from direct sun

7. WEATHERPROOFING MAINTENANCE (Annual):
   - Inspect O-ring for hardening/cracking (replace if needed)
   - Check all threaded connectors for tightness
   - Apply fresh dielectric grease to RF connector threads
   - Verify cable gland packing nut is snug
   - Inspect ventilation slots for obstructions

MODIFICATIONS:

- For battery-powered operation: Add 25mm to height for LiFePO4 pack
- For dual-antenna system: Add third SMA hole (box_w += 20mm)
- For larger touchscreen (5"): Increase box_w to 220mm
- For GPS module: Add small port on bottom (10mm × 10mm)
*/
